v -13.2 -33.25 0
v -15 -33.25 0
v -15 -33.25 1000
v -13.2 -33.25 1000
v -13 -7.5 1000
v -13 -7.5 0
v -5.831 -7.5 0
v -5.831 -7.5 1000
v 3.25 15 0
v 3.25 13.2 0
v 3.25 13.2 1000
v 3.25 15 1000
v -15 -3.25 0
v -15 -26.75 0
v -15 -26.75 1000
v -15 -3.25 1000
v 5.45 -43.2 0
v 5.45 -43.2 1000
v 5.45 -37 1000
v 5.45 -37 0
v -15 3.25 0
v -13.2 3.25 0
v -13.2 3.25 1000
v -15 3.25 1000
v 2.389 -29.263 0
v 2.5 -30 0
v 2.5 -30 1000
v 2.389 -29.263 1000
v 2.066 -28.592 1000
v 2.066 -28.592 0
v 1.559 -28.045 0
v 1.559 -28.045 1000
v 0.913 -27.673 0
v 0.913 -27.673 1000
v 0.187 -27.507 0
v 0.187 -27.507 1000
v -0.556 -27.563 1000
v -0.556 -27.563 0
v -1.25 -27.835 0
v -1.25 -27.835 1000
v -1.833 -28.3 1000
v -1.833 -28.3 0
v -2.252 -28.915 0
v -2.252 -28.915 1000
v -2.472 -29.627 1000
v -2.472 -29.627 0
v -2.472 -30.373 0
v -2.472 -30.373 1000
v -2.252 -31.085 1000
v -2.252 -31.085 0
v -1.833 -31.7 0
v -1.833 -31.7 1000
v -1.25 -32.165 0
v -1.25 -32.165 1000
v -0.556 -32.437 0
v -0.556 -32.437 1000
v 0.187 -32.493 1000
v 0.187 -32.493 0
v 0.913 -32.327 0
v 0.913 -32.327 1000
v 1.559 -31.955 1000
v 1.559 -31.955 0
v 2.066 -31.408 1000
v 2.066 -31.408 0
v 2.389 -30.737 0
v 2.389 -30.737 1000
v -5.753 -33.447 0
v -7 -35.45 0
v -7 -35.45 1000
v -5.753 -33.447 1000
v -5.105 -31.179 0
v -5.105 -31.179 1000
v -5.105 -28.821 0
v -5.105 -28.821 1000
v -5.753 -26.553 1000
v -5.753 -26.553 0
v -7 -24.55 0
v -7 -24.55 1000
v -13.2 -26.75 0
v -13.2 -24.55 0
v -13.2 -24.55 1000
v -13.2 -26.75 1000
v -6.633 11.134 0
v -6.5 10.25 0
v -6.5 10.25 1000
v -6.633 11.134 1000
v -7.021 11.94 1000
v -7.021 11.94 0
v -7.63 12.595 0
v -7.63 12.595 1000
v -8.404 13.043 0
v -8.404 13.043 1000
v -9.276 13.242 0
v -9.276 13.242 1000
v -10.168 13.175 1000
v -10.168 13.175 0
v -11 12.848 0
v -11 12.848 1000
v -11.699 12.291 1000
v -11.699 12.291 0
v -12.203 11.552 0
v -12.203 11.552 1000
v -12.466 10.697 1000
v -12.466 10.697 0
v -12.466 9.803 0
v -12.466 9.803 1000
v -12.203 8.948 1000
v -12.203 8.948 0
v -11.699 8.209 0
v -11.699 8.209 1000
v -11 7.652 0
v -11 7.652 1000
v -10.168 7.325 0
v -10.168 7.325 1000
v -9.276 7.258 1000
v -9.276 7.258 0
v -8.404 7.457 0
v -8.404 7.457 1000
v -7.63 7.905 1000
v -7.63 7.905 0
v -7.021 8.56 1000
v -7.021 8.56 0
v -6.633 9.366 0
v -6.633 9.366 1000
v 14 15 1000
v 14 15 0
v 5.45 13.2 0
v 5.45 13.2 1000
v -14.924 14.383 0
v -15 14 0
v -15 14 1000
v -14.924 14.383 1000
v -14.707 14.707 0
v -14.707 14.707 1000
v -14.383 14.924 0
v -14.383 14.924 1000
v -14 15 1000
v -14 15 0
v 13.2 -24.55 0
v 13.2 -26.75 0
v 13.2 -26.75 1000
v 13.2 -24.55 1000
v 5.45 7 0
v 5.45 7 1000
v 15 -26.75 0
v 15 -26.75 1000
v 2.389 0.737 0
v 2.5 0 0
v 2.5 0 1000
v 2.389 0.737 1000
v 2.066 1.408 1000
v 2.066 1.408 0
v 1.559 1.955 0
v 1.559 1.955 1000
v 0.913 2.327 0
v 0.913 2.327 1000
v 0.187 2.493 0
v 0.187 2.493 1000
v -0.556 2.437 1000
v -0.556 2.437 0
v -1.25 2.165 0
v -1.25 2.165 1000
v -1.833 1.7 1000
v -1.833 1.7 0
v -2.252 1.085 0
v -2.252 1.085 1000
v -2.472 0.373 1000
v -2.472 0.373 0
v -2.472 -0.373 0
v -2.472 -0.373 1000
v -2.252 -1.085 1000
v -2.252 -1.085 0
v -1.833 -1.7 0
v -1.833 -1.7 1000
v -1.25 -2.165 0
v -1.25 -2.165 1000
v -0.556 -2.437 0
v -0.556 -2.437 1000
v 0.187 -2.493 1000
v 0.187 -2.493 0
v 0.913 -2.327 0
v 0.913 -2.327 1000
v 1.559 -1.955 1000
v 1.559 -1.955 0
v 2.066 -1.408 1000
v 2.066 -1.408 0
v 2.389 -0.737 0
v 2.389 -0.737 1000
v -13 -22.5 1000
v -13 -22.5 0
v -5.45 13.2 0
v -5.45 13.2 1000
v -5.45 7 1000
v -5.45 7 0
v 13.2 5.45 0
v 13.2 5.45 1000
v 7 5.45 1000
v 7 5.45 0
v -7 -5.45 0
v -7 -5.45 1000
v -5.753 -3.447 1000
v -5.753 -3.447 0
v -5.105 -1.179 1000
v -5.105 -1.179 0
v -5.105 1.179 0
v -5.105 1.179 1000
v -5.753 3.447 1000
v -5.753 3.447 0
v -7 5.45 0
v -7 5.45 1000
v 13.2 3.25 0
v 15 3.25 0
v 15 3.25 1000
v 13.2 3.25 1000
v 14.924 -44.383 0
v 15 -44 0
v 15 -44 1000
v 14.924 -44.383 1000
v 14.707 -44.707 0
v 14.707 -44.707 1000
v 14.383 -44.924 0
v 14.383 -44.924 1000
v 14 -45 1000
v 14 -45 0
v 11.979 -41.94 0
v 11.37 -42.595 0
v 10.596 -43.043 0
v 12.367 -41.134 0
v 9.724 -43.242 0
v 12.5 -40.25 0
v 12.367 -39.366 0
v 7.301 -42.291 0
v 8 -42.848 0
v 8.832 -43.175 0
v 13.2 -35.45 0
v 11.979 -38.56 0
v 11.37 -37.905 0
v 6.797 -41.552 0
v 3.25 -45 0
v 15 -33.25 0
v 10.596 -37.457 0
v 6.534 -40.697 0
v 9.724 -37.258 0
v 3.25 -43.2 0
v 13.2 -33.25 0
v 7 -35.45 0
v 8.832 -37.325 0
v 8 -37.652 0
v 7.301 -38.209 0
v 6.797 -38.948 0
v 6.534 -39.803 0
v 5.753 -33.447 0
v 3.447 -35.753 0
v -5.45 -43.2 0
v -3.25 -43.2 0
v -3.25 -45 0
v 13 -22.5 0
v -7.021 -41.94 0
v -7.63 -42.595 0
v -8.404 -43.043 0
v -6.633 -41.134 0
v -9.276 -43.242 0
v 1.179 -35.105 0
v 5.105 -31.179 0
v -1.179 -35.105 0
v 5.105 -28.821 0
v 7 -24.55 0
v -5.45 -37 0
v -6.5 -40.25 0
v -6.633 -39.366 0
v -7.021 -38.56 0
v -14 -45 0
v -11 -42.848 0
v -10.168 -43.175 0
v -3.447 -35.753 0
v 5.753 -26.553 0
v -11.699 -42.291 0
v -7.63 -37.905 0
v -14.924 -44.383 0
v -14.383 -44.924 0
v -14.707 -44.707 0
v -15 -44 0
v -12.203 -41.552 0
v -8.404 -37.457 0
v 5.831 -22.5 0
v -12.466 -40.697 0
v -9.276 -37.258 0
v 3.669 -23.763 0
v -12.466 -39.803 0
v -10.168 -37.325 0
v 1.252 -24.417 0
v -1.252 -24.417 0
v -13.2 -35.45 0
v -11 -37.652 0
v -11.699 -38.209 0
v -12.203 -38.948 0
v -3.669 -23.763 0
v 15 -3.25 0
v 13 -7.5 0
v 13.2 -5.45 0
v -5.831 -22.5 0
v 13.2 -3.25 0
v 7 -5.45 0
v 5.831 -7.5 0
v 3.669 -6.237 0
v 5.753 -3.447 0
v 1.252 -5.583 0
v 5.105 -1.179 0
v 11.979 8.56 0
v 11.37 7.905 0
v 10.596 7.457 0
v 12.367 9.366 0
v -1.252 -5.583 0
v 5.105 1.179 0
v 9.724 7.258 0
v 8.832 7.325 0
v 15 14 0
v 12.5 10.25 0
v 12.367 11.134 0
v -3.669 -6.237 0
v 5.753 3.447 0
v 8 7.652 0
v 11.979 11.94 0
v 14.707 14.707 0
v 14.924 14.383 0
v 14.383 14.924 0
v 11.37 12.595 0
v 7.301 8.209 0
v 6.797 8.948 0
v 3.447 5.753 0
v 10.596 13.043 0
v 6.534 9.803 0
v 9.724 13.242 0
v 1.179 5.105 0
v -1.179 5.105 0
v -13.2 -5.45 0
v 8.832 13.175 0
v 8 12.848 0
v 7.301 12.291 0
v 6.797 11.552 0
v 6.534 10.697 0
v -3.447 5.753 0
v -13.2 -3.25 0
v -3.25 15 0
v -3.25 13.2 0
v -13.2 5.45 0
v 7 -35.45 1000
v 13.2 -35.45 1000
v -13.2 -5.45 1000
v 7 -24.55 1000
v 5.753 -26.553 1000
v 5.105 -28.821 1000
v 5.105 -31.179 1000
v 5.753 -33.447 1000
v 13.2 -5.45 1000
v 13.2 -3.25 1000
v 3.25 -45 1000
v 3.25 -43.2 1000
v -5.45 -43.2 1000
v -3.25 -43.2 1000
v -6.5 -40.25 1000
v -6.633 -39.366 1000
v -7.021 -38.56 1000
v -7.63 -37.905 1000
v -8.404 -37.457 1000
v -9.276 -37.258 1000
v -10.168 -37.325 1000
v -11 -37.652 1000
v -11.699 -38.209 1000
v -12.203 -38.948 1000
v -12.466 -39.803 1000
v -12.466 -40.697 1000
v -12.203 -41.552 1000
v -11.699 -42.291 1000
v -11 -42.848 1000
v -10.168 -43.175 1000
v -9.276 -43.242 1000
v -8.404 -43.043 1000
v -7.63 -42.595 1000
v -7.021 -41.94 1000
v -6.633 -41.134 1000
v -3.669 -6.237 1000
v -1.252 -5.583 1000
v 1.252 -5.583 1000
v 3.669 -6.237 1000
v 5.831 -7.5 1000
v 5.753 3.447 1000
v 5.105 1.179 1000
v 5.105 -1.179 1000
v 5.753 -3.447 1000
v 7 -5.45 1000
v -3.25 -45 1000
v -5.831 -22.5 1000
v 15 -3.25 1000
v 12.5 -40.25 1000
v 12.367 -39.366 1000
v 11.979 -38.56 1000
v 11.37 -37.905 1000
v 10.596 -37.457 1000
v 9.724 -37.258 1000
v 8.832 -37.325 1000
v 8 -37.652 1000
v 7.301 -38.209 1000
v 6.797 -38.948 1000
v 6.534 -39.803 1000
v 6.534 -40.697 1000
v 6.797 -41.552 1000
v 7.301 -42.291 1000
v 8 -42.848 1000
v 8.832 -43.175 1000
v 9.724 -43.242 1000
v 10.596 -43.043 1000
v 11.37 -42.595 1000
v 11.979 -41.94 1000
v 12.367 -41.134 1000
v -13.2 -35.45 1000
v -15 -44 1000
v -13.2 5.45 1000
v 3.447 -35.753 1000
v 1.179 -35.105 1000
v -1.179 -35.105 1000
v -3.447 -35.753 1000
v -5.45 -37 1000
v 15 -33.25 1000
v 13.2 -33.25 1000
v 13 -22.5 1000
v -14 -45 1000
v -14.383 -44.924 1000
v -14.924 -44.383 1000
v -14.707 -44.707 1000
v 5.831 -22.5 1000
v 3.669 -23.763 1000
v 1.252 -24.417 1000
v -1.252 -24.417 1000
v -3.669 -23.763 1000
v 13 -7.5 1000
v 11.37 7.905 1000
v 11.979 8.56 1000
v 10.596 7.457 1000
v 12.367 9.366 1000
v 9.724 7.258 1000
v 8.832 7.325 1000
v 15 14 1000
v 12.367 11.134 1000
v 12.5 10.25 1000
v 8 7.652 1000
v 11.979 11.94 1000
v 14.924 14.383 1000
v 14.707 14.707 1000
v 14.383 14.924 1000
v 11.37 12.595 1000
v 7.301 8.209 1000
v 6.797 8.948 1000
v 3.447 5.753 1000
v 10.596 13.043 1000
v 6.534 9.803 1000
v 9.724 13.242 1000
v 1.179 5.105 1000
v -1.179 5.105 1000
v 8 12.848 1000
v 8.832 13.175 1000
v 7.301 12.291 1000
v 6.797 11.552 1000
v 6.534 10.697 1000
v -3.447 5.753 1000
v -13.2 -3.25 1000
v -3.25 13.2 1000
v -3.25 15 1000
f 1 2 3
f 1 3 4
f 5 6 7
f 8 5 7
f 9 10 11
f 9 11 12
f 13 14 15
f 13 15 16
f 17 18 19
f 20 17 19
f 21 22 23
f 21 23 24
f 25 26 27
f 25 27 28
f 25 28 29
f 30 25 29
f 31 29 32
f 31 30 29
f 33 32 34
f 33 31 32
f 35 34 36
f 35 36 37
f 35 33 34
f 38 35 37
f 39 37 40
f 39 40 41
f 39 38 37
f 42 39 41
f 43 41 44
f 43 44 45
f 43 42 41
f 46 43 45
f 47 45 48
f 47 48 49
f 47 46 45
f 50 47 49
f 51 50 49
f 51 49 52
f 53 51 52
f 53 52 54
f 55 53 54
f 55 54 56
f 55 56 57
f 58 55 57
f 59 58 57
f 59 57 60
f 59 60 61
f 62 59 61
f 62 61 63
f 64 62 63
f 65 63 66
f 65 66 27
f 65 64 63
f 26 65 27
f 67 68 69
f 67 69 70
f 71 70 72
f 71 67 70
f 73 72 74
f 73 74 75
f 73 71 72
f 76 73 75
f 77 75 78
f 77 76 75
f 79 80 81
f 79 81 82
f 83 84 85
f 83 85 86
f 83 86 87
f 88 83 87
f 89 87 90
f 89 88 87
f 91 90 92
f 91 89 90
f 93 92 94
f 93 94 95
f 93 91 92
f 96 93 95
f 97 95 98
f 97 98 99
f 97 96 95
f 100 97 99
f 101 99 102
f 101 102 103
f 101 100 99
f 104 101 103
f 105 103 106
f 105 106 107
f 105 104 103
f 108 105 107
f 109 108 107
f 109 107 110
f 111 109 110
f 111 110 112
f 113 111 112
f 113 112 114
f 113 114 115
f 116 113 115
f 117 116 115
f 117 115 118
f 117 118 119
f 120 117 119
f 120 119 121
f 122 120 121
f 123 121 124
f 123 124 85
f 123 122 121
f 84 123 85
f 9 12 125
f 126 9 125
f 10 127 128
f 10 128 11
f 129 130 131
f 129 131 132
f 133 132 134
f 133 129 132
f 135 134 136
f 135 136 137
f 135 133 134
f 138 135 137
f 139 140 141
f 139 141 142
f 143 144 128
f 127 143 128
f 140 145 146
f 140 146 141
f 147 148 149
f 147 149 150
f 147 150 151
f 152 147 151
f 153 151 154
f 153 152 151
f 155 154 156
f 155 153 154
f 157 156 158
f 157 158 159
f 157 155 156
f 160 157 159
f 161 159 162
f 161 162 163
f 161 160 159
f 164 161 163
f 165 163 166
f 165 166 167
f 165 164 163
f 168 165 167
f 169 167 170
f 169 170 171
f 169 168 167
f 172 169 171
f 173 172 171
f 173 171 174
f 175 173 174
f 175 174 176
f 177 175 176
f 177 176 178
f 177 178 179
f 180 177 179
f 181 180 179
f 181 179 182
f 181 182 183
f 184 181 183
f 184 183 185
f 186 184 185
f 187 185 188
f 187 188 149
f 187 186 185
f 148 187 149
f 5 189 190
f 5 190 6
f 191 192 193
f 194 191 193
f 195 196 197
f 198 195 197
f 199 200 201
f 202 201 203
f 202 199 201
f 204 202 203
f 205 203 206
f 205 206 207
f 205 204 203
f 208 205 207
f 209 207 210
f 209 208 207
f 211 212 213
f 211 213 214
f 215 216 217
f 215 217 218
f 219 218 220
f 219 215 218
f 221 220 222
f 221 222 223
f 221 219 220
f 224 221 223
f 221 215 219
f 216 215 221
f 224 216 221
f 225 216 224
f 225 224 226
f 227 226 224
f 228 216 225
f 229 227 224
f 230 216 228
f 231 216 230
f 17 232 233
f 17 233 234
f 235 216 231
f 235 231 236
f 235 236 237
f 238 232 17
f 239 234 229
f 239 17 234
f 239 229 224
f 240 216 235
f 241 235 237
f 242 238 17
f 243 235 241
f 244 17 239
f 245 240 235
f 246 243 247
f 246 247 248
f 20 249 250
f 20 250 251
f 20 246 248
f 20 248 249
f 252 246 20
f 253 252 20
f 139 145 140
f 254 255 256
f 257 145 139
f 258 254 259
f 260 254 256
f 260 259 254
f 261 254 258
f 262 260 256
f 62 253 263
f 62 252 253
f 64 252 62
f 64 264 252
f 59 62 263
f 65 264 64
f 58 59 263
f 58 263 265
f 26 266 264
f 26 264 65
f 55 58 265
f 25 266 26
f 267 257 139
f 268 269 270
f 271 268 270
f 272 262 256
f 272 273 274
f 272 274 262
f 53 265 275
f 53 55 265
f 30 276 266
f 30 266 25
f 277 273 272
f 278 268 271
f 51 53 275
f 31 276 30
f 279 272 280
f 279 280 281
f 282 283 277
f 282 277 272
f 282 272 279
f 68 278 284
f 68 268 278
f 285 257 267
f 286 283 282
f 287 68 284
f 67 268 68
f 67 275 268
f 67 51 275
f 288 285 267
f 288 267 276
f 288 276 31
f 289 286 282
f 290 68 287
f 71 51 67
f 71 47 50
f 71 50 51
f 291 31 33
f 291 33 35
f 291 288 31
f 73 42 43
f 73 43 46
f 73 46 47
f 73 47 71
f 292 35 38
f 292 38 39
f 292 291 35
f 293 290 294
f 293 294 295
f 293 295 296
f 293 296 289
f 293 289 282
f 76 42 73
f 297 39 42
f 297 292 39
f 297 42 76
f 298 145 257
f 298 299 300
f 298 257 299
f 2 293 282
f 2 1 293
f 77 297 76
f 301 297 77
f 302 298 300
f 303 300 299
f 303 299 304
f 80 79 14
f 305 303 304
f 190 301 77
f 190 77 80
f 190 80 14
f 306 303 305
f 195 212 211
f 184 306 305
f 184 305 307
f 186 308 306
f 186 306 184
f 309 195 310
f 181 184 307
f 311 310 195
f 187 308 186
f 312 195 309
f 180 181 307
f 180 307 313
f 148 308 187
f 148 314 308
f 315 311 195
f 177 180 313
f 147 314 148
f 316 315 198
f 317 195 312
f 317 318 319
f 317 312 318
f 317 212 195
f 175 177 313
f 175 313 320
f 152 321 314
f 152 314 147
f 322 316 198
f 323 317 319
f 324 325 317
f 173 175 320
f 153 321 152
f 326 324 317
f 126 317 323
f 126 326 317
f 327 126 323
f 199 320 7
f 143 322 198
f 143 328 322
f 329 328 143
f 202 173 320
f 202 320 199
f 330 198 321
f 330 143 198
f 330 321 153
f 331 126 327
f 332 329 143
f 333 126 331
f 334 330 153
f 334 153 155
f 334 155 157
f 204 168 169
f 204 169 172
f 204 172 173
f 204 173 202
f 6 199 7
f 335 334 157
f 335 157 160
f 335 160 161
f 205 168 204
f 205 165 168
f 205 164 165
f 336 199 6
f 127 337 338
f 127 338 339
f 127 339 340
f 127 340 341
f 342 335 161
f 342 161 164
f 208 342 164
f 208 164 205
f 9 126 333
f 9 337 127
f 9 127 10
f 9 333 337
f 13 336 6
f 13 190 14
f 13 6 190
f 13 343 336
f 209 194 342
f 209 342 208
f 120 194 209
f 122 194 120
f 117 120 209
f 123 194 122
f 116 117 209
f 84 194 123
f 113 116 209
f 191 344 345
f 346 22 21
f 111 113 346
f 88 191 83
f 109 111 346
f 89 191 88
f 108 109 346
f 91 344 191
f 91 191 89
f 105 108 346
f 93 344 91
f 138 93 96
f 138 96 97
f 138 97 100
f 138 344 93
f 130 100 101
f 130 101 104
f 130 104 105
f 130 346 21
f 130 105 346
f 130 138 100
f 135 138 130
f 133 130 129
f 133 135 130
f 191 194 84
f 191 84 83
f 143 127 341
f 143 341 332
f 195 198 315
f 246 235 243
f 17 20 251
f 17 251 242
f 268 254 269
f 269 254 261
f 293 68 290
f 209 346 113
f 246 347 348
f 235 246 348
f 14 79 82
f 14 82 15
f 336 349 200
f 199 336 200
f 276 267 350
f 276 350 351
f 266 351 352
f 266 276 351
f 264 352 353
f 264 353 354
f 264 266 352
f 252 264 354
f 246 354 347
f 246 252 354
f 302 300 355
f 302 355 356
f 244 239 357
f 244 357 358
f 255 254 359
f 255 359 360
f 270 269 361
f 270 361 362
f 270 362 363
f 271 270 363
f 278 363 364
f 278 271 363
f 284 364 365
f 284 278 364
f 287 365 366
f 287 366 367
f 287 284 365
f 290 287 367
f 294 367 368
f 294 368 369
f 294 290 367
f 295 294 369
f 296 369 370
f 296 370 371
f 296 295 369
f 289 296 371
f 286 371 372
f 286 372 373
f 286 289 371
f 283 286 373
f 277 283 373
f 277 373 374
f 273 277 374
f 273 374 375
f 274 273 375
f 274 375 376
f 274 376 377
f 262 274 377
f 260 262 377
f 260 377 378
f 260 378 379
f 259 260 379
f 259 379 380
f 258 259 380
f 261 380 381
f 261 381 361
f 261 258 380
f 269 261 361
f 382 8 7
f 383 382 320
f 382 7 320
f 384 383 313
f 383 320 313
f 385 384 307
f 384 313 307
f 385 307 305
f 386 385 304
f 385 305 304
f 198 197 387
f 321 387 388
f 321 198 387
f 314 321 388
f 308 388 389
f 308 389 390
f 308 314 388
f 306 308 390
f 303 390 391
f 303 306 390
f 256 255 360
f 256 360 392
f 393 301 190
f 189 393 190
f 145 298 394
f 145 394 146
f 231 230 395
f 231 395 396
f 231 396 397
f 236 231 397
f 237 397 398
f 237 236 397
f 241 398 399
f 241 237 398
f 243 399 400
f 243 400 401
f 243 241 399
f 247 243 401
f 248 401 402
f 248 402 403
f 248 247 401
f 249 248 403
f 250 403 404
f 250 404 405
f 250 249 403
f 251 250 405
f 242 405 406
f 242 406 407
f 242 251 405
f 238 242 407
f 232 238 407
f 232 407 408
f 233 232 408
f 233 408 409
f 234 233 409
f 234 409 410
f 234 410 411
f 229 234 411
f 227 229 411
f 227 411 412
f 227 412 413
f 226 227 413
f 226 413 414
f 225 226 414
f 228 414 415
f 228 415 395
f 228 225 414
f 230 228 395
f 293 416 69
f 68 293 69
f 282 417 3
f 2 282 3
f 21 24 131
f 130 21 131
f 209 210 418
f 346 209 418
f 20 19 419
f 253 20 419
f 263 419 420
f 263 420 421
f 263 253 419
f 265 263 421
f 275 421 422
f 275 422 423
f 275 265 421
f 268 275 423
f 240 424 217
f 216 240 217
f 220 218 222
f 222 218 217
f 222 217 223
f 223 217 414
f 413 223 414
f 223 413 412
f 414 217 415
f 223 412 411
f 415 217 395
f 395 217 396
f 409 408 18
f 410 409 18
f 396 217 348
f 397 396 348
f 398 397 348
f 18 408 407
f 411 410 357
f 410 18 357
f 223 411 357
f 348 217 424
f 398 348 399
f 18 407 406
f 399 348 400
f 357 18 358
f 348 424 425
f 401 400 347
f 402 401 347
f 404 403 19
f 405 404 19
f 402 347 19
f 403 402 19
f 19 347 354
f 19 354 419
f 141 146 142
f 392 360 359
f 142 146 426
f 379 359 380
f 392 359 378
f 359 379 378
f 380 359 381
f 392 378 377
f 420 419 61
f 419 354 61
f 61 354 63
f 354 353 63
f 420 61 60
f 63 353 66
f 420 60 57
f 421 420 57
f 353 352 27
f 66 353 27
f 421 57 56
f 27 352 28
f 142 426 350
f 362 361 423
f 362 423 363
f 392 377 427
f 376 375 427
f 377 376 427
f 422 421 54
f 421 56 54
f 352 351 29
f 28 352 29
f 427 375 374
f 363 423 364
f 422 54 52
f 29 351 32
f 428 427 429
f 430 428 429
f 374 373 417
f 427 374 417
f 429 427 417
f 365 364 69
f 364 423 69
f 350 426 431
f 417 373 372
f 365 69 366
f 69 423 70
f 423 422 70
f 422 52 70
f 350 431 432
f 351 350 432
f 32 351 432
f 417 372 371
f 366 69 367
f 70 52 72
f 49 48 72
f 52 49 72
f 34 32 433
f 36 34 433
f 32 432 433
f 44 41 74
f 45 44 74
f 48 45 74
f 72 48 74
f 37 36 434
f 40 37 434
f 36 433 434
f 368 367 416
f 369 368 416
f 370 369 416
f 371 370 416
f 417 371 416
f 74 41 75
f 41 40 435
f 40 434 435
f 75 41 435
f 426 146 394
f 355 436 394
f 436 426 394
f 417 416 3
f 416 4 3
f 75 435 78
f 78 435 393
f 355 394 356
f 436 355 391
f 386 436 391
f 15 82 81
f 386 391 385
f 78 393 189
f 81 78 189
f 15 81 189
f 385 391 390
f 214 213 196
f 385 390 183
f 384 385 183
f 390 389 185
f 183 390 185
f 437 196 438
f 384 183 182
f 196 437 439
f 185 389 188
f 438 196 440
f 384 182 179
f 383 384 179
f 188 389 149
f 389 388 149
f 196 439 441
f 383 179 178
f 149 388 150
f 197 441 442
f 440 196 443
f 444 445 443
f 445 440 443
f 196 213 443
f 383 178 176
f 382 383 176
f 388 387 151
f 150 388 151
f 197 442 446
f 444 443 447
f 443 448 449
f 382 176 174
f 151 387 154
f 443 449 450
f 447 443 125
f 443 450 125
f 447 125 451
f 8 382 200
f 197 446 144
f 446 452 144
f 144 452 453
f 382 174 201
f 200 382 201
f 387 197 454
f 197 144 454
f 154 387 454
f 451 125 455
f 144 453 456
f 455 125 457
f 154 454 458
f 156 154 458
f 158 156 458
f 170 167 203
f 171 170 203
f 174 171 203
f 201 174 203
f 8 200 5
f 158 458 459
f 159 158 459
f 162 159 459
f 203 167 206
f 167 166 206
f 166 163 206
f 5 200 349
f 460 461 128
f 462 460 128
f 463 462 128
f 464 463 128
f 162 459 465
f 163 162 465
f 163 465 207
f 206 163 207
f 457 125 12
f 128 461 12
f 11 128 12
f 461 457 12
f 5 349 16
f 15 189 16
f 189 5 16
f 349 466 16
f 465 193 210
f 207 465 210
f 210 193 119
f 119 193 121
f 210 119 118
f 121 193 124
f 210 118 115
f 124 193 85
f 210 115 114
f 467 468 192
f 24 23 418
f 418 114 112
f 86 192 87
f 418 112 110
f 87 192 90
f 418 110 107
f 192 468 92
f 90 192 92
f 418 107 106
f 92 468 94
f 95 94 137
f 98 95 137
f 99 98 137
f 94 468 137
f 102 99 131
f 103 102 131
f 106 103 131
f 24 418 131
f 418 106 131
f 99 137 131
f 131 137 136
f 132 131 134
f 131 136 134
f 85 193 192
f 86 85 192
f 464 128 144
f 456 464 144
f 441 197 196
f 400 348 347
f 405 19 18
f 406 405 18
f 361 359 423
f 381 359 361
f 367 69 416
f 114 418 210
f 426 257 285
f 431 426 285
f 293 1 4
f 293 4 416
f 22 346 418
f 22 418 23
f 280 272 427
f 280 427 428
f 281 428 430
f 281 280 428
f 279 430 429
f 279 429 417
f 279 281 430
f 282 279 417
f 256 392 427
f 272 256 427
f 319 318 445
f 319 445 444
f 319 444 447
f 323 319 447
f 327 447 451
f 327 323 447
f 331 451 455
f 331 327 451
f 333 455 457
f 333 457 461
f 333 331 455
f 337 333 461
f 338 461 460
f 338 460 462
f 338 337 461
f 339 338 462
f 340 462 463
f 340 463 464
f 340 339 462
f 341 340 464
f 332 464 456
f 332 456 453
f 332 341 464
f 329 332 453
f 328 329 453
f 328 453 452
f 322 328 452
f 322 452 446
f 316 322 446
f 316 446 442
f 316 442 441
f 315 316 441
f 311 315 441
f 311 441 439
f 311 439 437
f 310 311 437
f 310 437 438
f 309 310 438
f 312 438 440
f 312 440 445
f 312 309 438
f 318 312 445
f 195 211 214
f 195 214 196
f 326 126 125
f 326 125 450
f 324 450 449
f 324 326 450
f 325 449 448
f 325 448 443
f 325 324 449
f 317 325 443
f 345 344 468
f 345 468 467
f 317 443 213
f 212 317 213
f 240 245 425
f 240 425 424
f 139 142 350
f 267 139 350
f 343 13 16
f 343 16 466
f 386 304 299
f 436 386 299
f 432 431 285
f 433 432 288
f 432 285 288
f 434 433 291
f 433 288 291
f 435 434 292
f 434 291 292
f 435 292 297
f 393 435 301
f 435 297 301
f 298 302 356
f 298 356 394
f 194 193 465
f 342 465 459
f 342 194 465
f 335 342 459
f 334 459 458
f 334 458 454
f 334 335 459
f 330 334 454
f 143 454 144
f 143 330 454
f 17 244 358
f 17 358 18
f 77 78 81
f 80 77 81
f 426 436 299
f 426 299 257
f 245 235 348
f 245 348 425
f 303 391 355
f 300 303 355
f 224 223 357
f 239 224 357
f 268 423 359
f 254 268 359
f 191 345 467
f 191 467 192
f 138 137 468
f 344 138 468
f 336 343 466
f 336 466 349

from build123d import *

# Parameters (mm, degrees)
SKETCH_1_R      = 2.5
SKETCH_1_R_2    = 3
EXTRUDE_1_DEPTH = 1000


with BuildPart() as part:
    # Эскиз1 → Бобышка-Вытянуть1 (new body)
    with BuildSketch(Plane.XY):
        with BuildLine():
            Line((-15, 5.45), (-15, 14))
            ThreePointArc((-15, 14), (-14.707106781, 14.707106781), (-14, 15))
            Line((-14, 15), (-5.45, 15))
            Line((-5.45, 15), (-3.25, 15))
            Line((-3.25, 15), (-3.25, 13.2))
            Line((-3.25, 13.2), (-5.45, 13.2))
            Line((-5.45, 13.2), (-5.45, 7))
            ThreePointArc((-5.45, 7), (0, 5.022844472), (5.45, 7))
            Line((5.45, 7), (5.45, 13.2))
            Line((5.45, 13.2), (3.25, 13.2))
            Line((3.25, 13.2), (3.25, 15))
            Line((3.25, 15), (5.45, 15))
            Line((5.45, 15), (14, 15))
            ThreePointArc((14, 15), (14.707106781, 14.707106781), (15, 14))
            Line((15, 14), (15, 5.45))
            Line((15, 5.45), (15, 3.25))
            Line((15, 3.25), (13.2, 3.25))
            Line((13.2, 3.25), (13.2, 5.45))
            Line((13.2, 5.45), (7, 5.45))
            ThreePointArc((7, 5.45), (5.022844472, 0), (7, -5.45))
            Line((7, -5.45), (13.2, -5.45))
            Line((13.2, -5.45), (13.2, -3.25))
            Line((13.2, -3.25), (15, -3.25))
            Line((15, -3.25), (15, -5.45))
            Line((15, -5.45), (15, -24.55))
            Line((15, -24.55), (15, -26.75))
            Line((15, -26.75), (13.2, -26.75))
            Line((13.2, -26.75), (13.2, -24.55))
            Line((13.2, -24.55), (7, -24.55))
            ThreePointArc((7, -24.55), (5.022844472, -30), (7, -35.45))
            Line((7, -35.45), (13.2, -35.45))
            Line((13.2, -35.45), (13.2, -33.25))
            Line((13.2, -33.25), (15, -33.25))
            Line((15, -33.25), (15, -35.45))
            Line((15, -35.45), (15, -44))
            ThreePointArc((15, -44), (14.707106781, -44.707106781), (14, -45))
            Line((14, -45), (5.45, -45))
            Line((5.45, -45), (3.25, -45))
            Line((3.25, -45), (3.25, -43.2))
            Line((3.25, -43.2), (5.45, -43.2))
            Line((5.45, -43.2), (5.45, -37))
            ThreePointArc((5.45, -37), (0, -35.022844472), (-5.45, -37))
            Line((-5.45, -37), (-5.45, -43.2))
            Line((-5.45, -43.2), (-3.25, -43.2))
            Line((-3.25, -43.2), (-3.25, -45))
            Line((-3.25, -45), (-5.45, -45))
            Line((-5.45, -45), (-14, -45))
            ThreePointArc((-14, -45), (-14.707106781, -44.707106781), (-15, -44))
            Line((-15, -44), (-15, -35.45))
            Line((-15, -35.45), (-15, -33.25))
            Line((-15, -33.25), (-13.2, -33.25))
            Line((-13.2, -33.25), (-13.2, -35.45))
            Line((-13.2, -35.45), (-7, -35.45))
            ThreePointArc((-7, -35.45), (-5.022844472, -30), (-7, -24.55))
            Line((-7, -24.55), (-13.2, -24.55))
            Line((-13.2, -24.55), (-13.2, -26.75))
            Line((-13.2, -26.75), (-15, -26.75))
            Line((-15, -26.75), (-15, -24.55))
            Line((-15, -24.55), (-15, -5.45))
            Line((-15, -5.45), (-15, -3.25))
            Line((-15, -3.25), (-13.2, -3.25))
            Line((-13.2, -3.25), (-13.2, -5.45))
            Line((-13.2, -5.45), (-7, -5.45))
            ThreePointArc((-7, -5.45), (-5.022844472, 0), (-7, 5.45))
            Line((-7, 5.45), (-13.2, 5.45))
            Line((-13.2, 5.45), (-13.2, 3.25))
            Line((-13.2, 3.25), (-15, 3.25))
            Line((-15, 3.25), (-15, 5.45))
        make_face()
        Circle(SKETCH_1_R, mode=Mode.SUBTRACT)
        with Locations((0, -30)):
            Circle(SKETCH_1_R, mode=Mode.SUBTRACT)
        with Locations((-9.5, 10.25)):
            Circle(SKETCH_1_R_2, mode=Mode.SUBTRACT)
        with Locations((9.5, 10.25)):
            Circle(SKETCH_1_R_2, mode=Mode.SUBTRACT)
        with Locations((-9.5, -40.25)):
            Circle(SKETCH_1_R_2, mode=Mode.SUBTRACT)
        with Locations((9.5, -40.25)):
            Circle(SKETCH_1_R_2, mode=Mode.SUBTRACT)
        with BuildLine():
            Line((-13, -22.5), (-13, -7.5))
            Line((-13, -7.5), (-5.830951895, -7.5))
            ThreePointArc((-5.830951895, -7.5), (0, -5.5), (5.830951895, -7.5))
            Line((5.830951895, -7.5), (13, -7.5))
            Line((13, -7.5), (13, -22.5))
            Line((13, -22.5), (5.830951895, -22.5))
            ThreePointArc((5.830951895, -22.5), (0, -24.5), (-5.830951895, -22.5))
            Line((-5.830951895, -22.5), (-13, -22.5))
        make_face(mode=Mode.SUBTRACT)
    extrude(amount=EXTRUDE_1_DEPTH)


solid = part.part
